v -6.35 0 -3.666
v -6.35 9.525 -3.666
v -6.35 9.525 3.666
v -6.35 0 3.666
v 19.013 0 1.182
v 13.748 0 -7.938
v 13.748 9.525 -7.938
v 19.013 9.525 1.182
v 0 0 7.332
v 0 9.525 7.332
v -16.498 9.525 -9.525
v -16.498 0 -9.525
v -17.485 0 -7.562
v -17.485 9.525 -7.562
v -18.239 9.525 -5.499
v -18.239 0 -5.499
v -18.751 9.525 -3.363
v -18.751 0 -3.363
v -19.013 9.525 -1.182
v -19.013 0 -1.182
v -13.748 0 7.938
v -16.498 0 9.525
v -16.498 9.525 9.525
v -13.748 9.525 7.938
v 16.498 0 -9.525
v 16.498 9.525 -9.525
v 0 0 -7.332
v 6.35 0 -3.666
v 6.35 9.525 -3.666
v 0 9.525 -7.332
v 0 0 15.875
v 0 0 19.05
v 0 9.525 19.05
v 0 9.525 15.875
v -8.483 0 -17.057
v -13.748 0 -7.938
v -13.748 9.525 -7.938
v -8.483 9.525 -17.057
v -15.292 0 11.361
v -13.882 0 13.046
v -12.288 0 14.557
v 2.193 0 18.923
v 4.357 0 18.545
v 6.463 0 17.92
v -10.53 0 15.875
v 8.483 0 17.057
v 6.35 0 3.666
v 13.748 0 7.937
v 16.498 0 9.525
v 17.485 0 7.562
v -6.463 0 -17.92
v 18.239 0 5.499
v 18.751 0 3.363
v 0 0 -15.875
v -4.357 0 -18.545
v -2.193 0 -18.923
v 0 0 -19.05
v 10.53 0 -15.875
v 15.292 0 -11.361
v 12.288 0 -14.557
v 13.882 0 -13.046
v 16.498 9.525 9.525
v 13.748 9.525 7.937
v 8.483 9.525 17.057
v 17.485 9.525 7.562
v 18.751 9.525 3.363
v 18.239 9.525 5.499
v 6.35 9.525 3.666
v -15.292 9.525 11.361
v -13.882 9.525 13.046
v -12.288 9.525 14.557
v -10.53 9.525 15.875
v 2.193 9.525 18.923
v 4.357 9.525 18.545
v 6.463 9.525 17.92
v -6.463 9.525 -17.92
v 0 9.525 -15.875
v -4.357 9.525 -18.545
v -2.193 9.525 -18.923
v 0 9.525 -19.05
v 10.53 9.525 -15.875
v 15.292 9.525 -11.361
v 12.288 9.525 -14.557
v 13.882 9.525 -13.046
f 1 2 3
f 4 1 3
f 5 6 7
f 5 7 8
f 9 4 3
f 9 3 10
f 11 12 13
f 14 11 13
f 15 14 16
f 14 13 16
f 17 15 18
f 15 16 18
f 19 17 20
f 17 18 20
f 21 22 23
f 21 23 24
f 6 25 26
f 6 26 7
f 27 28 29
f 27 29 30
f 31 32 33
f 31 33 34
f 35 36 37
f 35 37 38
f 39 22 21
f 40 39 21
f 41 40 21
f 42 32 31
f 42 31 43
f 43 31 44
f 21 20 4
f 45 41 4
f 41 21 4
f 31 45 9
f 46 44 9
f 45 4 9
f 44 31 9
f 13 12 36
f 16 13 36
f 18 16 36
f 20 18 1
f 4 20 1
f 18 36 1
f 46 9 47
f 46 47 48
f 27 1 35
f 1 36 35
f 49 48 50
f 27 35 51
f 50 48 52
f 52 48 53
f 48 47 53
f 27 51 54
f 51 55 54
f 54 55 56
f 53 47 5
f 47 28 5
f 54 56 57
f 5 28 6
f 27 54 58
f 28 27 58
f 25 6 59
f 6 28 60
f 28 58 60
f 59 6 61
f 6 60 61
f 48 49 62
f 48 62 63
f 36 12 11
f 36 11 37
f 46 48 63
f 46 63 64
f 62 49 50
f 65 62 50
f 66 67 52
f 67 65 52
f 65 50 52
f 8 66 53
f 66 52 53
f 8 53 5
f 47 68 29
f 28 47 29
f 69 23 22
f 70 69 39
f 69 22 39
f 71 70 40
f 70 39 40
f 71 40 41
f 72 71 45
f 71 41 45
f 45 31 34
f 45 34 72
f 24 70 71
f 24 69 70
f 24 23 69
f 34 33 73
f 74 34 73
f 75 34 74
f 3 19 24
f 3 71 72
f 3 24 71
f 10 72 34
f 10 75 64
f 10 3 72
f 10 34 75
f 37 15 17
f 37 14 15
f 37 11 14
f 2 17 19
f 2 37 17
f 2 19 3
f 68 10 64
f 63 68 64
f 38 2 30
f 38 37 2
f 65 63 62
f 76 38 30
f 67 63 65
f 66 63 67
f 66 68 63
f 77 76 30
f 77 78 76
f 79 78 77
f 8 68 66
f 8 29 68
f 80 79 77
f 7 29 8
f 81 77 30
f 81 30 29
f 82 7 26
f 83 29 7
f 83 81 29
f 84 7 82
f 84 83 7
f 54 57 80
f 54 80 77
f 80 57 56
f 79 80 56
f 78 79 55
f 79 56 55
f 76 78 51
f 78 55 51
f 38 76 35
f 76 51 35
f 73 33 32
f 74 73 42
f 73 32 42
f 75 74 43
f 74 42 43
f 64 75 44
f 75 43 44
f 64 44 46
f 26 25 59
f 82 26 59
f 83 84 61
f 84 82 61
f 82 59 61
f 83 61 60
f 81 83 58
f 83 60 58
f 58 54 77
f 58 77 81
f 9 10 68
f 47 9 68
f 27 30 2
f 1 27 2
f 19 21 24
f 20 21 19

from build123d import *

# Parameters (mm, degrees)
SKETCH2_R           = 19.05
BOSS_EXTRUDE2_DEPTH = 9.525
CUT_EXTRUDE1_START  = -10.525
CUT_EXTRUDE1_DEPTH  = 11.525
CIRPATTERN1_COUNT   = 6
CUT_EXTRUDE2_DEPTH  = 10.525


with BuildPart() as part:
    # Sketch2 → Boss-Extrude2 (new body)
    with BuildSketch(Plane(origin=(0, 0, 0), x_dir=(1, 0, 0), z_dir=(0, 1, 0))):
        Circle(SKETCH2_R)
    extrude(amount=BOSS_EXTRUDE2_DEPTH)

    # Sketch3 → Cut-Extrude1 (cut)
    with BuildSketch(Plane(origin=(0, 9.525, 0), x_dir=(1, 0, 0), z_dir=(0, 1, 0)).offset(CUT_EXTRUDE1_START)):
        Polygon((0, 120.586851799), (0, 19.05), (0, 15.875), (10.530283709, 15.875), (112.067135509, 15.875), (250.709992792, 164.25655956), (138.642857283, 268.96841136), align=None)
    cut_extrude1 = extrude(amount=CUT_EXTRUDE1_DEPTH, mode=Mode.SUBTRACT)

    # CirPattern1: Cut-Extrude1 ×6 about axis
    cirpattern1_axis = Axis((0, 9.525, 0), (0, -1, 0))
    for i in range(1, CIRPATTERN1_COUNT):
        add(cut_extrude1.rotate(cirpattern1_axis, i * 360 / CIRPATTERN1_COUNT), mode=Mode.SUBTRACT)

    # Sketch4 → Cut-Extrude2 (cut, through all)
    with BuildSketch(Plane(origin=(0, 9.525, 0), x_dir=(1, 0, 0), z_dir=(0, 1, 0))):
        Polygon((0, 7.332348419), (-6.35, 3.666174209), (-6.35, -3.666174209), (0, -7.332348419), (6.35, -3.666174209), (6.35, 3.666174209), align=None)
    extrude(amount=-CUT_EXTRUDE2_DEPTH, mode=Mode.SUBTRACT)


solid = part.part
